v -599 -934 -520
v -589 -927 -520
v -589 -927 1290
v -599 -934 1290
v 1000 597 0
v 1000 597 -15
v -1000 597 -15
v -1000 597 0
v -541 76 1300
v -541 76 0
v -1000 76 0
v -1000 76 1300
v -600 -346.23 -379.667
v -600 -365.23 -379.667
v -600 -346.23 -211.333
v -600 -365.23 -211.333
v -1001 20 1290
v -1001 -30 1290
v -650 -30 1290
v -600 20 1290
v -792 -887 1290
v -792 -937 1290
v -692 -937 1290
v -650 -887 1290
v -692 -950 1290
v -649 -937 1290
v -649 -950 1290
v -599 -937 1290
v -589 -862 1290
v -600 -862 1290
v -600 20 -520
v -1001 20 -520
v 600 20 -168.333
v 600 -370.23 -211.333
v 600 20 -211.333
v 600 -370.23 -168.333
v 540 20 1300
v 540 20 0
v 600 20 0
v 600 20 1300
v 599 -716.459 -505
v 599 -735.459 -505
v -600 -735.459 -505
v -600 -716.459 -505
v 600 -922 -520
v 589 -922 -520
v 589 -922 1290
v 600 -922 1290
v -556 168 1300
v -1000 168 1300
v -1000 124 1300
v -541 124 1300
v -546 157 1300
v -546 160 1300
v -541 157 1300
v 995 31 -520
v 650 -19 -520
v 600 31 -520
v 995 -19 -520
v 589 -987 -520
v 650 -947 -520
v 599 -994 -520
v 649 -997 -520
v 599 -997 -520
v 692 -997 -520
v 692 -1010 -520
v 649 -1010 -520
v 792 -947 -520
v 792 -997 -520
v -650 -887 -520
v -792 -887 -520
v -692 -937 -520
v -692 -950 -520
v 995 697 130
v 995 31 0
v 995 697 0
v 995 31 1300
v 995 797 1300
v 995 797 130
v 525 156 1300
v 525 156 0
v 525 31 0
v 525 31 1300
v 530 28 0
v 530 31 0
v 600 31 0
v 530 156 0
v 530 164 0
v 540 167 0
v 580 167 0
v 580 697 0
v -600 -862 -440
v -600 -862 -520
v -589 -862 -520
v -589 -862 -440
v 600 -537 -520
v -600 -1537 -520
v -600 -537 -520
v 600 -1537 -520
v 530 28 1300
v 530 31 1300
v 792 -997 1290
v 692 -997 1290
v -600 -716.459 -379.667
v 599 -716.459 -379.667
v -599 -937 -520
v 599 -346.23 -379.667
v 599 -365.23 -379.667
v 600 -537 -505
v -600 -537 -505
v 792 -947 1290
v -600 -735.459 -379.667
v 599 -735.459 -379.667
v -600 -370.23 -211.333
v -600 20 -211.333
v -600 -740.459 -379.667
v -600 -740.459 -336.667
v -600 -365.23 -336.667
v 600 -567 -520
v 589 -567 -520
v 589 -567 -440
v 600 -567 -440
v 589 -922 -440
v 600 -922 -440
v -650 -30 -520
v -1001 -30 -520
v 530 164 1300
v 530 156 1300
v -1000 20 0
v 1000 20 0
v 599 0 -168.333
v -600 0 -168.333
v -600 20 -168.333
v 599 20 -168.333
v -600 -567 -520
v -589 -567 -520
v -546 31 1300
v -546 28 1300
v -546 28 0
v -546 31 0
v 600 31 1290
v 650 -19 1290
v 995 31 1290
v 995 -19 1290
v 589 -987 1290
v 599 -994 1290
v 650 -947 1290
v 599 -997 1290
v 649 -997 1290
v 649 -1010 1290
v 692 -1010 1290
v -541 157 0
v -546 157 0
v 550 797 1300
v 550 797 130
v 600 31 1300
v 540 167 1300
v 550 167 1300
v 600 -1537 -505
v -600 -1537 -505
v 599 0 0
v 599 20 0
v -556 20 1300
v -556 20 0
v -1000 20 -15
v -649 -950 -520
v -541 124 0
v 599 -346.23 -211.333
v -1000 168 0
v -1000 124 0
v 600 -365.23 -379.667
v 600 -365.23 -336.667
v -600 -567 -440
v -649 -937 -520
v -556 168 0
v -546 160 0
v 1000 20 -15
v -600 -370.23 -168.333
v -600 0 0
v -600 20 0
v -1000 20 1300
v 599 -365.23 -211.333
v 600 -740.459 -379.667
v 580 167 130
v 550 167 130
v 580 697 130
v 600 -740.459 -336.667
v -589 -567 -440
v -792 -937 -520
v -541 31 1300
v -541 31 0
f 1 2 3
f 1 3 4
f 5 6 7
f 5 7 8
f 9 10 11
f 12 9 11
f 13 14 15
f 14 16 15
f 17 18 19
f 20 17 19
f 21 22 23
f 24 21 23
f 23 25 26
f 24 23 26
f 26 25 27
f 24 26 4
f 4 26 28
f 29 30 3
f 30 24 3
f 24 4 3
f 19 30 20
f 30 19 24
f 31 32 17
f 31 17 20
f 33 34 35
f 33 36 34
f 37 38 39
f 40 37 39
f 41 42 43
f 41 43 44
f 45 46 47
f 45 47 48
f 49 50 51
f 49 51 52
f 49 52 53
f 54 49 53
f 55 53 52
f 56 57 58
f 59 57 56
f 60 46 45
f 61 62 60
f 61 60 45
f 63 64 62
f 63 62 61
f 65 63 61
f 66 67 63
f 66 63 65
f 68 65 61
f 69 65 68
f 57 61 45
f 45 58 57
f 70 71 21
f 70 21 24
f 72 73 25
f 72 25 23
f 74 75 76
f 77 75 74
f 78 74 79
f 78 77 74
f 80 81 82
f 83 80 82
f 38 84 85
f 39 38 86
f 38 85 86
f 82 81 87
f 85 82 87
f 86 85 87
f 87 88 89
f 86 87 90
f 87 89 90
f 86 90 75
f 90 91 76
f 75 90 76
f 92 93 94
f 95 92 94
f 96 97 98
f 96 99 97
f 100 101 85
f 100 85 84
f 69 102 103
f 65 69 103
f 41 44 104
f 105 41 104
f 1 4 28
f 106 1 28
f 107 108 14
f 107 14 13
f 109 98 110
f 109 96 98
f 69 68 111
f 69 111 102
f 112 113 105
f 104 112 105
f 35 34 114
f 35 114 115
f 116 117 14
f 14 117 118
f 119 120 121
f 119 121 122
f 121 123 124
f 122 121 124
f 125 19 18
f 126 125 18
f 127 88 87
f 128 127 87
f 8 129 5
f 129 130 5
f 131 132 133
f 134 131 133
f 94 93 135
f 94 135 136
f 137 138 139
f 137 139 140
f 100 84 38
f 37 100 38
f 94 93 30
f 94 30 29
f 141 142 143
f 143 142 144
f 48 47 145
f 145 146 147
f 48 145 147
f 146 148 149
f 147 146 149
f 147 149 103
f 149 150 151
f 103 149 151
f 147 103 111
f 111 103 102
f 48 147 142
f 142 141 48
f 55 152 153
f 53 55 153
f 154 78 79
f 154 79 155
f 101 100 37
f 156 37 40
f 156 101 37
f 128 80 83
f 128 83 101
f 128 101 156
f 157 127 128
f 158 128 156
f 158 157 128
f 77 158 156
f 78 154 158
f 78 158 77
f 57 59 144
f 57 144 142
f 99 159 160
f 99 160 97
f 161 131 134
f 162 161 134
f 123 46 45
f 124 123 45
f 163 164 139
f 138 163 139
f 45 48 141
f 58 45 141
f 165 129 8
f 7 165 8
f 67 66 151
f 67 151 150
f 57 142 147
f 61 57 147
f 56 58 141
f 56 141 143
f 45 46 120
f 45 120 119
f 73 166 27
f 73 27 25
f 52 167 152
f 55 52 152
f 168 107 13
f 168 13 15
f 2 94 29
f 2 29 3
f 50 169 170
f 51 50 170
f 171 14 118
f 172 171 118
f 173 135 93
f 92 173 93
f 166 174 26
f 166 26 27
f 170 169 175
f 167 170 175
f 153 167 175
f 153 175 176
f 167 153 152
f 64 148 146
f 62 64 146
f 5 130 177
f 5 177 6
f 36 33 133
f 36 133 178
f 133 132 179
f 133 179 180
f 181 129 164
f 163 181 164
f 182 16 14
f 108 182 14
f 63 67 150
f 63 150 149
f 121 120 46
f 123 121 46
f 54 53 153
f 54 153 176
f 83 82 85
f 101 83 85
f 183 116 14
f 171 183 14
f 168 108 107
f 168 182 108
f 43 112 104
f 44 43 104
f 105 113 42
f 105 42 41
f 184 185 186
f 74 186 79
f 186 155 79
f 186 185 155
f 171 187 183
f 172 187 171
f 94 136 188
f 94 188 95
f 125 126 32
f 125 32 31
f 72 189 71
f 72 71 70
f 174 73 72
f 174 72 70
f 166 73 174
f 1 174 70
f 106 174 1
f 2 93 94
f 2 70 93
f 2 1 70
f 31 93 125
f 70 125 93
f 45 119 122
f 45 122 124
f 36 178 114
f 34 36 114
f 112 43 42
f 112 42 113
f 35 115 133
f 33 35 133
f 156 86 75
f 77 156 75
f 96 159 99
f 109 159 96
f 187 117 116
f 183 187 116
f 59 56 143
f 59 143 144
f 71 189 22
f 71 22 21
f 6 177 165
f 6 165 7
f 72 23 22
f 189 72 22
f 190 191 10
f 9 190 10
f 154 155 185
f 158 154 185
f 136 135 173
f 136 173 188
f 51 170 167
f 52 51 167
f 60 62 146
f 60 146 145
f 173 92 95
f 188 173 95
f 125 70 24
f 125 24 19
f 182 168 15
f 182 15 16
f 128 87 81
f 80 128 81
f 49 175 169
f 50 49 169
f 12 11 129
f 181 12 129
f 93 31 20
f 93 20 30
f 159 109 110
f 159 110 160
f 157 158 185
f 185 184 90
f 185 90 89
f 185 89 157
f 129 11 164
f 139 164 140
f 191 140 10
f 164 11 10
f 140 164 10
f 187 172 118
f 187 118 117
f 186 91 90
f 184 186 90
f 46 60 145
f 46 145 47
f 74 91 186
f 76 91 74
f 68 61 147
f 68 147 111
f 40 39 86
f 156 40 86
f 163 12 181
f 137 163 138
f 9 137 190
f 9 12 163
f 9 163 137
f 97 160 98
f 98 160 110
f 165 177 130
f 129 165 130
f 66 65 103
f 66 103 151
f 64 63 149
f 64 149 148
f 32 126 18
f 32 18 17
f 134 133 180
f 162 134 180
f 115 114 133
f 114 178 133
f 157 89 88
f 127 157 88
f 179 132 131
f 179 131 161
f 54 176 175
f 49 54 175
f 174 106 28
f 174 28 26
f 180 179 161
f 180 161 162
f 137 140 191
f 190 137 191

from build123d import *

# Parameters (mm, degrees)
F1_DEPTH  = 600
F0_W      = 577
F0_H      = 15
F2_DEPTH  = 1000
F4_DEPTH  = 1300
F3_W      = 415
F3_H      = 430
F3_H_2    = 100
F6_DEPTH  = 1170
F9_DEPTH  = 1810
F8_W      = 11
F8_H      = 355
F10_DEPTH = 80
F8_H_2    = 295
F12_DEPTH = 1200
F11_W     = 20
F11_H     = 168.3333333333
F14_DEPTH = 1199
F11_W_2   = 19
F11_H_2   = 125.3333333333


with BuildPart() as f1:
    # F0 (on Right) → F1 (new body, symmetric)
    with BuildSketch(Plane.YZ):
        Polygon((-537, -520), (-537, -505), (-557, -505), (-1537, -505), (-1537, -520), align=None)
    extrude(amount=F1_DEPTH, both=True)


with BuildPart() as f2:
    # F0 (on Right) → F2 (new body, symmetric)
    with BuildSketch(Plane.YZ):
        with Locations((308.5, -7.5)):
            Rectangle(F0_W, F0_H)
    extrude(amount=F2_DEPTH, both=True)


with BuildPart() as f4:
    # F3 (on face) → F4 (new body)
    with BuildSketch(Plane.XY):
        Polygon((-600, 20), (-556, 20), (-546, 28), (-546, 31), (-541, 31), (-541, 76), (-1000, 76), (-1000, 20), align=None)
    extrude(amount=F4_DEPTH)


with BuildPart() as f4b:
    # F3 (on face) → F4, piece 2 (new body)
    with BuildSketch(Plane.XY):
        Polygon((-1000, 168), (-1000, 124), (-541, 124), (-541, 157), (-546, 157), (-546, 160), (-556, 168), (-600, 168), align=None)
    extrude(amount=F4_DEPTH)


with BuildPart() as f4c:
    # F3 (on face) → F4, piece 3 (new body)
    with BuildSketch(Plane.XY):
        Polygon((530, 31), (600, 31), (995, 31), (995, 167), (580, 167), (540, 167), (530, 164), (530, 156), (525, 156), (525, 31), align=None)
        with Locations((787.5, 382)):
            Rectangle(F3_W, F3_H)
        with Locations((787.5, 647)):
            Rectangle(F3_W, F3_H_2)
        Polygon((540, 20), (600, 20), (600, 31), (530, 31), (530, 28), align=None)
    extrude(amount=F4_DEPTH)

    # F5 (on face) → F6 (join)
    with BuildSketch(Plane.XY.offset(1300)):
        Polygon((550, 797), (550, 167), (580, 167), (580, 697), (995, 697), (995, 797), align=None)
    extrude(amount=-F6_DEPTH)


with BuildPart() as f9:
    # F8 (on offset) → F9 (new body)
    with BuildSketch(Plane(origin=(0, 0, -520), x_dir=(1, 0, 0), z_dir=(0, 0, -1))):
        Polygon((600, -31), (995, -31), (995, 19), (650, 19), (650, 947), (792, 947), (792, 997), (692, 997), (692, 1010), (649, 1010), (649, 997), (599, 997), (599, 994), (589, 987), (589, 922), (600, 922), (600, 567), align=None)
    extrude(amount=-F9_DEPTH)


with BuildPart() as f9b:
    # F8 (on offset) → F9, piece 2 (new body)
    with BuildSketch(Plane(origin=(0, 0, -520), x_dir=(1, 0, 0), z_dir=(0, 0, -1))):
        Polygon((-1001, 30), (-1001, -20), (-600, -20), (-600, 567), (-600, 862), (-589, 862), (-589, 927), (-599, 934), (-599, 937), (-649, 937), (-649, 950), (-692, 950), (-692, 937), (-792, 937), (-792, 887), (-650, 887), (-650, 30), align=None)
    extrude(amount=-F9_DEPTH)


with BuildPart() as f10:
    # F8 (on offset) → F10 (new body)
    with BuildSketch(Plane(origin=(0, 0, -520), x_dir=(1, 0, 0), z_dir=(0, 0, -1))):
        with Locations((594.5, 744.5)):
            Rectangle(F8_W, F8_H)
    extrude(amount=-F10_DEPTH)


with BuildPart() as f10b:
    # F8 (on offset) → F10, piece 2 (new body)
    with BuildSketch(Plane(origin=(0, 0, -520), x_dir=(1, 0, 0), z_dir=(0, 0, -1))):
        with Locations((-594.5, 714.5)):
            Rectangle(F8_W, F8_H_2)
    extrude(amount=-F10_DEPTH)


with BuildPart() as f12:
    # F11 (on face) → F12 (new body)
    with BuildSketch(Plane.YZ.offset(-600)):
        Polygon((-370.2296350365, -211.3333333333), (-365.2296350365, -211.3333333333), (-346.2296350365, -211.3333333333), (-19, -211.3333333333), (-19, -168.3333333333), (-370.2296350365, -168.3333333333), align=None)
        Polygon((0, -168.3333333333), (-19, -168.3333333333), (-19, -211.3333333333), (20, -211.3333333333), (20, -168.3333333333), align=None)
    extrude(amount=F12_DEPTH)


with BuildPart() as f12b:
    # F11 (on face) → F12, piece 2 (new body)
    with BuildSketch(Plane.YZ.offset(-600)):
        Polygon((-735.4592700729, -379.6666666667), (-716.4592700729, -379.6666666667), (-365.2296350365, -379.6666666667), (-365.2296350365, -336.6666666667), (-740.4592700729, -336.6666666667), (-740.4592700729, -379.6666666667), align=None)
    extrude(amount=F12_DEPTH)

    # F13: cut F10b, F10
    add(f10b.part, mode=Mode.SUBTRACT)
    add(f10.part, mode=Mode.SUBTRACT)


with BuildPart() as f14:
    # F11 (on face) → F14 (new body)
    with BuildSketch(Plane.YZ.offset(-600)):
        with Locations((10, -84.1666666667)):
            Rectangle(F11_W, F11_H)
    extrude(amount=F14_DEPTH)


with BuildPart() as f14b:
    # F11 (on face) → F14, piece 2 (new body)
    with BuildSketch(Plane.YZ.offset(-600)):
        Polygon((-365.2296350365, -336.6666666667), (-365.2296350365, -379.6666666667), (-346.2296350365, -379.6666666667), (-346.2296350365, -211.3333333333), (-365.2296350365, -211.3333333333), align=None)
    extrude(amount=F14_DEPTH)


with BuildPart() as f14c:
    # F11 (on face) → F14, piece 3 (new body)
    with BuildSketch(Plane.YZ.offset(-600)):
        with Locations((-725.9592700729, -442.3333333333)):
            Rectangle(F11_W_2, F11_H_2)
    extrude(amount=F14_DEPTH)


solid = Compound([f1.part, f2.part, f4.part, f4b.part, f4c.part, f9.part, f9b.part, f10.part, f10b.part, f12.part, f12b.part, f14.part, f14b.part, f14c.part])
